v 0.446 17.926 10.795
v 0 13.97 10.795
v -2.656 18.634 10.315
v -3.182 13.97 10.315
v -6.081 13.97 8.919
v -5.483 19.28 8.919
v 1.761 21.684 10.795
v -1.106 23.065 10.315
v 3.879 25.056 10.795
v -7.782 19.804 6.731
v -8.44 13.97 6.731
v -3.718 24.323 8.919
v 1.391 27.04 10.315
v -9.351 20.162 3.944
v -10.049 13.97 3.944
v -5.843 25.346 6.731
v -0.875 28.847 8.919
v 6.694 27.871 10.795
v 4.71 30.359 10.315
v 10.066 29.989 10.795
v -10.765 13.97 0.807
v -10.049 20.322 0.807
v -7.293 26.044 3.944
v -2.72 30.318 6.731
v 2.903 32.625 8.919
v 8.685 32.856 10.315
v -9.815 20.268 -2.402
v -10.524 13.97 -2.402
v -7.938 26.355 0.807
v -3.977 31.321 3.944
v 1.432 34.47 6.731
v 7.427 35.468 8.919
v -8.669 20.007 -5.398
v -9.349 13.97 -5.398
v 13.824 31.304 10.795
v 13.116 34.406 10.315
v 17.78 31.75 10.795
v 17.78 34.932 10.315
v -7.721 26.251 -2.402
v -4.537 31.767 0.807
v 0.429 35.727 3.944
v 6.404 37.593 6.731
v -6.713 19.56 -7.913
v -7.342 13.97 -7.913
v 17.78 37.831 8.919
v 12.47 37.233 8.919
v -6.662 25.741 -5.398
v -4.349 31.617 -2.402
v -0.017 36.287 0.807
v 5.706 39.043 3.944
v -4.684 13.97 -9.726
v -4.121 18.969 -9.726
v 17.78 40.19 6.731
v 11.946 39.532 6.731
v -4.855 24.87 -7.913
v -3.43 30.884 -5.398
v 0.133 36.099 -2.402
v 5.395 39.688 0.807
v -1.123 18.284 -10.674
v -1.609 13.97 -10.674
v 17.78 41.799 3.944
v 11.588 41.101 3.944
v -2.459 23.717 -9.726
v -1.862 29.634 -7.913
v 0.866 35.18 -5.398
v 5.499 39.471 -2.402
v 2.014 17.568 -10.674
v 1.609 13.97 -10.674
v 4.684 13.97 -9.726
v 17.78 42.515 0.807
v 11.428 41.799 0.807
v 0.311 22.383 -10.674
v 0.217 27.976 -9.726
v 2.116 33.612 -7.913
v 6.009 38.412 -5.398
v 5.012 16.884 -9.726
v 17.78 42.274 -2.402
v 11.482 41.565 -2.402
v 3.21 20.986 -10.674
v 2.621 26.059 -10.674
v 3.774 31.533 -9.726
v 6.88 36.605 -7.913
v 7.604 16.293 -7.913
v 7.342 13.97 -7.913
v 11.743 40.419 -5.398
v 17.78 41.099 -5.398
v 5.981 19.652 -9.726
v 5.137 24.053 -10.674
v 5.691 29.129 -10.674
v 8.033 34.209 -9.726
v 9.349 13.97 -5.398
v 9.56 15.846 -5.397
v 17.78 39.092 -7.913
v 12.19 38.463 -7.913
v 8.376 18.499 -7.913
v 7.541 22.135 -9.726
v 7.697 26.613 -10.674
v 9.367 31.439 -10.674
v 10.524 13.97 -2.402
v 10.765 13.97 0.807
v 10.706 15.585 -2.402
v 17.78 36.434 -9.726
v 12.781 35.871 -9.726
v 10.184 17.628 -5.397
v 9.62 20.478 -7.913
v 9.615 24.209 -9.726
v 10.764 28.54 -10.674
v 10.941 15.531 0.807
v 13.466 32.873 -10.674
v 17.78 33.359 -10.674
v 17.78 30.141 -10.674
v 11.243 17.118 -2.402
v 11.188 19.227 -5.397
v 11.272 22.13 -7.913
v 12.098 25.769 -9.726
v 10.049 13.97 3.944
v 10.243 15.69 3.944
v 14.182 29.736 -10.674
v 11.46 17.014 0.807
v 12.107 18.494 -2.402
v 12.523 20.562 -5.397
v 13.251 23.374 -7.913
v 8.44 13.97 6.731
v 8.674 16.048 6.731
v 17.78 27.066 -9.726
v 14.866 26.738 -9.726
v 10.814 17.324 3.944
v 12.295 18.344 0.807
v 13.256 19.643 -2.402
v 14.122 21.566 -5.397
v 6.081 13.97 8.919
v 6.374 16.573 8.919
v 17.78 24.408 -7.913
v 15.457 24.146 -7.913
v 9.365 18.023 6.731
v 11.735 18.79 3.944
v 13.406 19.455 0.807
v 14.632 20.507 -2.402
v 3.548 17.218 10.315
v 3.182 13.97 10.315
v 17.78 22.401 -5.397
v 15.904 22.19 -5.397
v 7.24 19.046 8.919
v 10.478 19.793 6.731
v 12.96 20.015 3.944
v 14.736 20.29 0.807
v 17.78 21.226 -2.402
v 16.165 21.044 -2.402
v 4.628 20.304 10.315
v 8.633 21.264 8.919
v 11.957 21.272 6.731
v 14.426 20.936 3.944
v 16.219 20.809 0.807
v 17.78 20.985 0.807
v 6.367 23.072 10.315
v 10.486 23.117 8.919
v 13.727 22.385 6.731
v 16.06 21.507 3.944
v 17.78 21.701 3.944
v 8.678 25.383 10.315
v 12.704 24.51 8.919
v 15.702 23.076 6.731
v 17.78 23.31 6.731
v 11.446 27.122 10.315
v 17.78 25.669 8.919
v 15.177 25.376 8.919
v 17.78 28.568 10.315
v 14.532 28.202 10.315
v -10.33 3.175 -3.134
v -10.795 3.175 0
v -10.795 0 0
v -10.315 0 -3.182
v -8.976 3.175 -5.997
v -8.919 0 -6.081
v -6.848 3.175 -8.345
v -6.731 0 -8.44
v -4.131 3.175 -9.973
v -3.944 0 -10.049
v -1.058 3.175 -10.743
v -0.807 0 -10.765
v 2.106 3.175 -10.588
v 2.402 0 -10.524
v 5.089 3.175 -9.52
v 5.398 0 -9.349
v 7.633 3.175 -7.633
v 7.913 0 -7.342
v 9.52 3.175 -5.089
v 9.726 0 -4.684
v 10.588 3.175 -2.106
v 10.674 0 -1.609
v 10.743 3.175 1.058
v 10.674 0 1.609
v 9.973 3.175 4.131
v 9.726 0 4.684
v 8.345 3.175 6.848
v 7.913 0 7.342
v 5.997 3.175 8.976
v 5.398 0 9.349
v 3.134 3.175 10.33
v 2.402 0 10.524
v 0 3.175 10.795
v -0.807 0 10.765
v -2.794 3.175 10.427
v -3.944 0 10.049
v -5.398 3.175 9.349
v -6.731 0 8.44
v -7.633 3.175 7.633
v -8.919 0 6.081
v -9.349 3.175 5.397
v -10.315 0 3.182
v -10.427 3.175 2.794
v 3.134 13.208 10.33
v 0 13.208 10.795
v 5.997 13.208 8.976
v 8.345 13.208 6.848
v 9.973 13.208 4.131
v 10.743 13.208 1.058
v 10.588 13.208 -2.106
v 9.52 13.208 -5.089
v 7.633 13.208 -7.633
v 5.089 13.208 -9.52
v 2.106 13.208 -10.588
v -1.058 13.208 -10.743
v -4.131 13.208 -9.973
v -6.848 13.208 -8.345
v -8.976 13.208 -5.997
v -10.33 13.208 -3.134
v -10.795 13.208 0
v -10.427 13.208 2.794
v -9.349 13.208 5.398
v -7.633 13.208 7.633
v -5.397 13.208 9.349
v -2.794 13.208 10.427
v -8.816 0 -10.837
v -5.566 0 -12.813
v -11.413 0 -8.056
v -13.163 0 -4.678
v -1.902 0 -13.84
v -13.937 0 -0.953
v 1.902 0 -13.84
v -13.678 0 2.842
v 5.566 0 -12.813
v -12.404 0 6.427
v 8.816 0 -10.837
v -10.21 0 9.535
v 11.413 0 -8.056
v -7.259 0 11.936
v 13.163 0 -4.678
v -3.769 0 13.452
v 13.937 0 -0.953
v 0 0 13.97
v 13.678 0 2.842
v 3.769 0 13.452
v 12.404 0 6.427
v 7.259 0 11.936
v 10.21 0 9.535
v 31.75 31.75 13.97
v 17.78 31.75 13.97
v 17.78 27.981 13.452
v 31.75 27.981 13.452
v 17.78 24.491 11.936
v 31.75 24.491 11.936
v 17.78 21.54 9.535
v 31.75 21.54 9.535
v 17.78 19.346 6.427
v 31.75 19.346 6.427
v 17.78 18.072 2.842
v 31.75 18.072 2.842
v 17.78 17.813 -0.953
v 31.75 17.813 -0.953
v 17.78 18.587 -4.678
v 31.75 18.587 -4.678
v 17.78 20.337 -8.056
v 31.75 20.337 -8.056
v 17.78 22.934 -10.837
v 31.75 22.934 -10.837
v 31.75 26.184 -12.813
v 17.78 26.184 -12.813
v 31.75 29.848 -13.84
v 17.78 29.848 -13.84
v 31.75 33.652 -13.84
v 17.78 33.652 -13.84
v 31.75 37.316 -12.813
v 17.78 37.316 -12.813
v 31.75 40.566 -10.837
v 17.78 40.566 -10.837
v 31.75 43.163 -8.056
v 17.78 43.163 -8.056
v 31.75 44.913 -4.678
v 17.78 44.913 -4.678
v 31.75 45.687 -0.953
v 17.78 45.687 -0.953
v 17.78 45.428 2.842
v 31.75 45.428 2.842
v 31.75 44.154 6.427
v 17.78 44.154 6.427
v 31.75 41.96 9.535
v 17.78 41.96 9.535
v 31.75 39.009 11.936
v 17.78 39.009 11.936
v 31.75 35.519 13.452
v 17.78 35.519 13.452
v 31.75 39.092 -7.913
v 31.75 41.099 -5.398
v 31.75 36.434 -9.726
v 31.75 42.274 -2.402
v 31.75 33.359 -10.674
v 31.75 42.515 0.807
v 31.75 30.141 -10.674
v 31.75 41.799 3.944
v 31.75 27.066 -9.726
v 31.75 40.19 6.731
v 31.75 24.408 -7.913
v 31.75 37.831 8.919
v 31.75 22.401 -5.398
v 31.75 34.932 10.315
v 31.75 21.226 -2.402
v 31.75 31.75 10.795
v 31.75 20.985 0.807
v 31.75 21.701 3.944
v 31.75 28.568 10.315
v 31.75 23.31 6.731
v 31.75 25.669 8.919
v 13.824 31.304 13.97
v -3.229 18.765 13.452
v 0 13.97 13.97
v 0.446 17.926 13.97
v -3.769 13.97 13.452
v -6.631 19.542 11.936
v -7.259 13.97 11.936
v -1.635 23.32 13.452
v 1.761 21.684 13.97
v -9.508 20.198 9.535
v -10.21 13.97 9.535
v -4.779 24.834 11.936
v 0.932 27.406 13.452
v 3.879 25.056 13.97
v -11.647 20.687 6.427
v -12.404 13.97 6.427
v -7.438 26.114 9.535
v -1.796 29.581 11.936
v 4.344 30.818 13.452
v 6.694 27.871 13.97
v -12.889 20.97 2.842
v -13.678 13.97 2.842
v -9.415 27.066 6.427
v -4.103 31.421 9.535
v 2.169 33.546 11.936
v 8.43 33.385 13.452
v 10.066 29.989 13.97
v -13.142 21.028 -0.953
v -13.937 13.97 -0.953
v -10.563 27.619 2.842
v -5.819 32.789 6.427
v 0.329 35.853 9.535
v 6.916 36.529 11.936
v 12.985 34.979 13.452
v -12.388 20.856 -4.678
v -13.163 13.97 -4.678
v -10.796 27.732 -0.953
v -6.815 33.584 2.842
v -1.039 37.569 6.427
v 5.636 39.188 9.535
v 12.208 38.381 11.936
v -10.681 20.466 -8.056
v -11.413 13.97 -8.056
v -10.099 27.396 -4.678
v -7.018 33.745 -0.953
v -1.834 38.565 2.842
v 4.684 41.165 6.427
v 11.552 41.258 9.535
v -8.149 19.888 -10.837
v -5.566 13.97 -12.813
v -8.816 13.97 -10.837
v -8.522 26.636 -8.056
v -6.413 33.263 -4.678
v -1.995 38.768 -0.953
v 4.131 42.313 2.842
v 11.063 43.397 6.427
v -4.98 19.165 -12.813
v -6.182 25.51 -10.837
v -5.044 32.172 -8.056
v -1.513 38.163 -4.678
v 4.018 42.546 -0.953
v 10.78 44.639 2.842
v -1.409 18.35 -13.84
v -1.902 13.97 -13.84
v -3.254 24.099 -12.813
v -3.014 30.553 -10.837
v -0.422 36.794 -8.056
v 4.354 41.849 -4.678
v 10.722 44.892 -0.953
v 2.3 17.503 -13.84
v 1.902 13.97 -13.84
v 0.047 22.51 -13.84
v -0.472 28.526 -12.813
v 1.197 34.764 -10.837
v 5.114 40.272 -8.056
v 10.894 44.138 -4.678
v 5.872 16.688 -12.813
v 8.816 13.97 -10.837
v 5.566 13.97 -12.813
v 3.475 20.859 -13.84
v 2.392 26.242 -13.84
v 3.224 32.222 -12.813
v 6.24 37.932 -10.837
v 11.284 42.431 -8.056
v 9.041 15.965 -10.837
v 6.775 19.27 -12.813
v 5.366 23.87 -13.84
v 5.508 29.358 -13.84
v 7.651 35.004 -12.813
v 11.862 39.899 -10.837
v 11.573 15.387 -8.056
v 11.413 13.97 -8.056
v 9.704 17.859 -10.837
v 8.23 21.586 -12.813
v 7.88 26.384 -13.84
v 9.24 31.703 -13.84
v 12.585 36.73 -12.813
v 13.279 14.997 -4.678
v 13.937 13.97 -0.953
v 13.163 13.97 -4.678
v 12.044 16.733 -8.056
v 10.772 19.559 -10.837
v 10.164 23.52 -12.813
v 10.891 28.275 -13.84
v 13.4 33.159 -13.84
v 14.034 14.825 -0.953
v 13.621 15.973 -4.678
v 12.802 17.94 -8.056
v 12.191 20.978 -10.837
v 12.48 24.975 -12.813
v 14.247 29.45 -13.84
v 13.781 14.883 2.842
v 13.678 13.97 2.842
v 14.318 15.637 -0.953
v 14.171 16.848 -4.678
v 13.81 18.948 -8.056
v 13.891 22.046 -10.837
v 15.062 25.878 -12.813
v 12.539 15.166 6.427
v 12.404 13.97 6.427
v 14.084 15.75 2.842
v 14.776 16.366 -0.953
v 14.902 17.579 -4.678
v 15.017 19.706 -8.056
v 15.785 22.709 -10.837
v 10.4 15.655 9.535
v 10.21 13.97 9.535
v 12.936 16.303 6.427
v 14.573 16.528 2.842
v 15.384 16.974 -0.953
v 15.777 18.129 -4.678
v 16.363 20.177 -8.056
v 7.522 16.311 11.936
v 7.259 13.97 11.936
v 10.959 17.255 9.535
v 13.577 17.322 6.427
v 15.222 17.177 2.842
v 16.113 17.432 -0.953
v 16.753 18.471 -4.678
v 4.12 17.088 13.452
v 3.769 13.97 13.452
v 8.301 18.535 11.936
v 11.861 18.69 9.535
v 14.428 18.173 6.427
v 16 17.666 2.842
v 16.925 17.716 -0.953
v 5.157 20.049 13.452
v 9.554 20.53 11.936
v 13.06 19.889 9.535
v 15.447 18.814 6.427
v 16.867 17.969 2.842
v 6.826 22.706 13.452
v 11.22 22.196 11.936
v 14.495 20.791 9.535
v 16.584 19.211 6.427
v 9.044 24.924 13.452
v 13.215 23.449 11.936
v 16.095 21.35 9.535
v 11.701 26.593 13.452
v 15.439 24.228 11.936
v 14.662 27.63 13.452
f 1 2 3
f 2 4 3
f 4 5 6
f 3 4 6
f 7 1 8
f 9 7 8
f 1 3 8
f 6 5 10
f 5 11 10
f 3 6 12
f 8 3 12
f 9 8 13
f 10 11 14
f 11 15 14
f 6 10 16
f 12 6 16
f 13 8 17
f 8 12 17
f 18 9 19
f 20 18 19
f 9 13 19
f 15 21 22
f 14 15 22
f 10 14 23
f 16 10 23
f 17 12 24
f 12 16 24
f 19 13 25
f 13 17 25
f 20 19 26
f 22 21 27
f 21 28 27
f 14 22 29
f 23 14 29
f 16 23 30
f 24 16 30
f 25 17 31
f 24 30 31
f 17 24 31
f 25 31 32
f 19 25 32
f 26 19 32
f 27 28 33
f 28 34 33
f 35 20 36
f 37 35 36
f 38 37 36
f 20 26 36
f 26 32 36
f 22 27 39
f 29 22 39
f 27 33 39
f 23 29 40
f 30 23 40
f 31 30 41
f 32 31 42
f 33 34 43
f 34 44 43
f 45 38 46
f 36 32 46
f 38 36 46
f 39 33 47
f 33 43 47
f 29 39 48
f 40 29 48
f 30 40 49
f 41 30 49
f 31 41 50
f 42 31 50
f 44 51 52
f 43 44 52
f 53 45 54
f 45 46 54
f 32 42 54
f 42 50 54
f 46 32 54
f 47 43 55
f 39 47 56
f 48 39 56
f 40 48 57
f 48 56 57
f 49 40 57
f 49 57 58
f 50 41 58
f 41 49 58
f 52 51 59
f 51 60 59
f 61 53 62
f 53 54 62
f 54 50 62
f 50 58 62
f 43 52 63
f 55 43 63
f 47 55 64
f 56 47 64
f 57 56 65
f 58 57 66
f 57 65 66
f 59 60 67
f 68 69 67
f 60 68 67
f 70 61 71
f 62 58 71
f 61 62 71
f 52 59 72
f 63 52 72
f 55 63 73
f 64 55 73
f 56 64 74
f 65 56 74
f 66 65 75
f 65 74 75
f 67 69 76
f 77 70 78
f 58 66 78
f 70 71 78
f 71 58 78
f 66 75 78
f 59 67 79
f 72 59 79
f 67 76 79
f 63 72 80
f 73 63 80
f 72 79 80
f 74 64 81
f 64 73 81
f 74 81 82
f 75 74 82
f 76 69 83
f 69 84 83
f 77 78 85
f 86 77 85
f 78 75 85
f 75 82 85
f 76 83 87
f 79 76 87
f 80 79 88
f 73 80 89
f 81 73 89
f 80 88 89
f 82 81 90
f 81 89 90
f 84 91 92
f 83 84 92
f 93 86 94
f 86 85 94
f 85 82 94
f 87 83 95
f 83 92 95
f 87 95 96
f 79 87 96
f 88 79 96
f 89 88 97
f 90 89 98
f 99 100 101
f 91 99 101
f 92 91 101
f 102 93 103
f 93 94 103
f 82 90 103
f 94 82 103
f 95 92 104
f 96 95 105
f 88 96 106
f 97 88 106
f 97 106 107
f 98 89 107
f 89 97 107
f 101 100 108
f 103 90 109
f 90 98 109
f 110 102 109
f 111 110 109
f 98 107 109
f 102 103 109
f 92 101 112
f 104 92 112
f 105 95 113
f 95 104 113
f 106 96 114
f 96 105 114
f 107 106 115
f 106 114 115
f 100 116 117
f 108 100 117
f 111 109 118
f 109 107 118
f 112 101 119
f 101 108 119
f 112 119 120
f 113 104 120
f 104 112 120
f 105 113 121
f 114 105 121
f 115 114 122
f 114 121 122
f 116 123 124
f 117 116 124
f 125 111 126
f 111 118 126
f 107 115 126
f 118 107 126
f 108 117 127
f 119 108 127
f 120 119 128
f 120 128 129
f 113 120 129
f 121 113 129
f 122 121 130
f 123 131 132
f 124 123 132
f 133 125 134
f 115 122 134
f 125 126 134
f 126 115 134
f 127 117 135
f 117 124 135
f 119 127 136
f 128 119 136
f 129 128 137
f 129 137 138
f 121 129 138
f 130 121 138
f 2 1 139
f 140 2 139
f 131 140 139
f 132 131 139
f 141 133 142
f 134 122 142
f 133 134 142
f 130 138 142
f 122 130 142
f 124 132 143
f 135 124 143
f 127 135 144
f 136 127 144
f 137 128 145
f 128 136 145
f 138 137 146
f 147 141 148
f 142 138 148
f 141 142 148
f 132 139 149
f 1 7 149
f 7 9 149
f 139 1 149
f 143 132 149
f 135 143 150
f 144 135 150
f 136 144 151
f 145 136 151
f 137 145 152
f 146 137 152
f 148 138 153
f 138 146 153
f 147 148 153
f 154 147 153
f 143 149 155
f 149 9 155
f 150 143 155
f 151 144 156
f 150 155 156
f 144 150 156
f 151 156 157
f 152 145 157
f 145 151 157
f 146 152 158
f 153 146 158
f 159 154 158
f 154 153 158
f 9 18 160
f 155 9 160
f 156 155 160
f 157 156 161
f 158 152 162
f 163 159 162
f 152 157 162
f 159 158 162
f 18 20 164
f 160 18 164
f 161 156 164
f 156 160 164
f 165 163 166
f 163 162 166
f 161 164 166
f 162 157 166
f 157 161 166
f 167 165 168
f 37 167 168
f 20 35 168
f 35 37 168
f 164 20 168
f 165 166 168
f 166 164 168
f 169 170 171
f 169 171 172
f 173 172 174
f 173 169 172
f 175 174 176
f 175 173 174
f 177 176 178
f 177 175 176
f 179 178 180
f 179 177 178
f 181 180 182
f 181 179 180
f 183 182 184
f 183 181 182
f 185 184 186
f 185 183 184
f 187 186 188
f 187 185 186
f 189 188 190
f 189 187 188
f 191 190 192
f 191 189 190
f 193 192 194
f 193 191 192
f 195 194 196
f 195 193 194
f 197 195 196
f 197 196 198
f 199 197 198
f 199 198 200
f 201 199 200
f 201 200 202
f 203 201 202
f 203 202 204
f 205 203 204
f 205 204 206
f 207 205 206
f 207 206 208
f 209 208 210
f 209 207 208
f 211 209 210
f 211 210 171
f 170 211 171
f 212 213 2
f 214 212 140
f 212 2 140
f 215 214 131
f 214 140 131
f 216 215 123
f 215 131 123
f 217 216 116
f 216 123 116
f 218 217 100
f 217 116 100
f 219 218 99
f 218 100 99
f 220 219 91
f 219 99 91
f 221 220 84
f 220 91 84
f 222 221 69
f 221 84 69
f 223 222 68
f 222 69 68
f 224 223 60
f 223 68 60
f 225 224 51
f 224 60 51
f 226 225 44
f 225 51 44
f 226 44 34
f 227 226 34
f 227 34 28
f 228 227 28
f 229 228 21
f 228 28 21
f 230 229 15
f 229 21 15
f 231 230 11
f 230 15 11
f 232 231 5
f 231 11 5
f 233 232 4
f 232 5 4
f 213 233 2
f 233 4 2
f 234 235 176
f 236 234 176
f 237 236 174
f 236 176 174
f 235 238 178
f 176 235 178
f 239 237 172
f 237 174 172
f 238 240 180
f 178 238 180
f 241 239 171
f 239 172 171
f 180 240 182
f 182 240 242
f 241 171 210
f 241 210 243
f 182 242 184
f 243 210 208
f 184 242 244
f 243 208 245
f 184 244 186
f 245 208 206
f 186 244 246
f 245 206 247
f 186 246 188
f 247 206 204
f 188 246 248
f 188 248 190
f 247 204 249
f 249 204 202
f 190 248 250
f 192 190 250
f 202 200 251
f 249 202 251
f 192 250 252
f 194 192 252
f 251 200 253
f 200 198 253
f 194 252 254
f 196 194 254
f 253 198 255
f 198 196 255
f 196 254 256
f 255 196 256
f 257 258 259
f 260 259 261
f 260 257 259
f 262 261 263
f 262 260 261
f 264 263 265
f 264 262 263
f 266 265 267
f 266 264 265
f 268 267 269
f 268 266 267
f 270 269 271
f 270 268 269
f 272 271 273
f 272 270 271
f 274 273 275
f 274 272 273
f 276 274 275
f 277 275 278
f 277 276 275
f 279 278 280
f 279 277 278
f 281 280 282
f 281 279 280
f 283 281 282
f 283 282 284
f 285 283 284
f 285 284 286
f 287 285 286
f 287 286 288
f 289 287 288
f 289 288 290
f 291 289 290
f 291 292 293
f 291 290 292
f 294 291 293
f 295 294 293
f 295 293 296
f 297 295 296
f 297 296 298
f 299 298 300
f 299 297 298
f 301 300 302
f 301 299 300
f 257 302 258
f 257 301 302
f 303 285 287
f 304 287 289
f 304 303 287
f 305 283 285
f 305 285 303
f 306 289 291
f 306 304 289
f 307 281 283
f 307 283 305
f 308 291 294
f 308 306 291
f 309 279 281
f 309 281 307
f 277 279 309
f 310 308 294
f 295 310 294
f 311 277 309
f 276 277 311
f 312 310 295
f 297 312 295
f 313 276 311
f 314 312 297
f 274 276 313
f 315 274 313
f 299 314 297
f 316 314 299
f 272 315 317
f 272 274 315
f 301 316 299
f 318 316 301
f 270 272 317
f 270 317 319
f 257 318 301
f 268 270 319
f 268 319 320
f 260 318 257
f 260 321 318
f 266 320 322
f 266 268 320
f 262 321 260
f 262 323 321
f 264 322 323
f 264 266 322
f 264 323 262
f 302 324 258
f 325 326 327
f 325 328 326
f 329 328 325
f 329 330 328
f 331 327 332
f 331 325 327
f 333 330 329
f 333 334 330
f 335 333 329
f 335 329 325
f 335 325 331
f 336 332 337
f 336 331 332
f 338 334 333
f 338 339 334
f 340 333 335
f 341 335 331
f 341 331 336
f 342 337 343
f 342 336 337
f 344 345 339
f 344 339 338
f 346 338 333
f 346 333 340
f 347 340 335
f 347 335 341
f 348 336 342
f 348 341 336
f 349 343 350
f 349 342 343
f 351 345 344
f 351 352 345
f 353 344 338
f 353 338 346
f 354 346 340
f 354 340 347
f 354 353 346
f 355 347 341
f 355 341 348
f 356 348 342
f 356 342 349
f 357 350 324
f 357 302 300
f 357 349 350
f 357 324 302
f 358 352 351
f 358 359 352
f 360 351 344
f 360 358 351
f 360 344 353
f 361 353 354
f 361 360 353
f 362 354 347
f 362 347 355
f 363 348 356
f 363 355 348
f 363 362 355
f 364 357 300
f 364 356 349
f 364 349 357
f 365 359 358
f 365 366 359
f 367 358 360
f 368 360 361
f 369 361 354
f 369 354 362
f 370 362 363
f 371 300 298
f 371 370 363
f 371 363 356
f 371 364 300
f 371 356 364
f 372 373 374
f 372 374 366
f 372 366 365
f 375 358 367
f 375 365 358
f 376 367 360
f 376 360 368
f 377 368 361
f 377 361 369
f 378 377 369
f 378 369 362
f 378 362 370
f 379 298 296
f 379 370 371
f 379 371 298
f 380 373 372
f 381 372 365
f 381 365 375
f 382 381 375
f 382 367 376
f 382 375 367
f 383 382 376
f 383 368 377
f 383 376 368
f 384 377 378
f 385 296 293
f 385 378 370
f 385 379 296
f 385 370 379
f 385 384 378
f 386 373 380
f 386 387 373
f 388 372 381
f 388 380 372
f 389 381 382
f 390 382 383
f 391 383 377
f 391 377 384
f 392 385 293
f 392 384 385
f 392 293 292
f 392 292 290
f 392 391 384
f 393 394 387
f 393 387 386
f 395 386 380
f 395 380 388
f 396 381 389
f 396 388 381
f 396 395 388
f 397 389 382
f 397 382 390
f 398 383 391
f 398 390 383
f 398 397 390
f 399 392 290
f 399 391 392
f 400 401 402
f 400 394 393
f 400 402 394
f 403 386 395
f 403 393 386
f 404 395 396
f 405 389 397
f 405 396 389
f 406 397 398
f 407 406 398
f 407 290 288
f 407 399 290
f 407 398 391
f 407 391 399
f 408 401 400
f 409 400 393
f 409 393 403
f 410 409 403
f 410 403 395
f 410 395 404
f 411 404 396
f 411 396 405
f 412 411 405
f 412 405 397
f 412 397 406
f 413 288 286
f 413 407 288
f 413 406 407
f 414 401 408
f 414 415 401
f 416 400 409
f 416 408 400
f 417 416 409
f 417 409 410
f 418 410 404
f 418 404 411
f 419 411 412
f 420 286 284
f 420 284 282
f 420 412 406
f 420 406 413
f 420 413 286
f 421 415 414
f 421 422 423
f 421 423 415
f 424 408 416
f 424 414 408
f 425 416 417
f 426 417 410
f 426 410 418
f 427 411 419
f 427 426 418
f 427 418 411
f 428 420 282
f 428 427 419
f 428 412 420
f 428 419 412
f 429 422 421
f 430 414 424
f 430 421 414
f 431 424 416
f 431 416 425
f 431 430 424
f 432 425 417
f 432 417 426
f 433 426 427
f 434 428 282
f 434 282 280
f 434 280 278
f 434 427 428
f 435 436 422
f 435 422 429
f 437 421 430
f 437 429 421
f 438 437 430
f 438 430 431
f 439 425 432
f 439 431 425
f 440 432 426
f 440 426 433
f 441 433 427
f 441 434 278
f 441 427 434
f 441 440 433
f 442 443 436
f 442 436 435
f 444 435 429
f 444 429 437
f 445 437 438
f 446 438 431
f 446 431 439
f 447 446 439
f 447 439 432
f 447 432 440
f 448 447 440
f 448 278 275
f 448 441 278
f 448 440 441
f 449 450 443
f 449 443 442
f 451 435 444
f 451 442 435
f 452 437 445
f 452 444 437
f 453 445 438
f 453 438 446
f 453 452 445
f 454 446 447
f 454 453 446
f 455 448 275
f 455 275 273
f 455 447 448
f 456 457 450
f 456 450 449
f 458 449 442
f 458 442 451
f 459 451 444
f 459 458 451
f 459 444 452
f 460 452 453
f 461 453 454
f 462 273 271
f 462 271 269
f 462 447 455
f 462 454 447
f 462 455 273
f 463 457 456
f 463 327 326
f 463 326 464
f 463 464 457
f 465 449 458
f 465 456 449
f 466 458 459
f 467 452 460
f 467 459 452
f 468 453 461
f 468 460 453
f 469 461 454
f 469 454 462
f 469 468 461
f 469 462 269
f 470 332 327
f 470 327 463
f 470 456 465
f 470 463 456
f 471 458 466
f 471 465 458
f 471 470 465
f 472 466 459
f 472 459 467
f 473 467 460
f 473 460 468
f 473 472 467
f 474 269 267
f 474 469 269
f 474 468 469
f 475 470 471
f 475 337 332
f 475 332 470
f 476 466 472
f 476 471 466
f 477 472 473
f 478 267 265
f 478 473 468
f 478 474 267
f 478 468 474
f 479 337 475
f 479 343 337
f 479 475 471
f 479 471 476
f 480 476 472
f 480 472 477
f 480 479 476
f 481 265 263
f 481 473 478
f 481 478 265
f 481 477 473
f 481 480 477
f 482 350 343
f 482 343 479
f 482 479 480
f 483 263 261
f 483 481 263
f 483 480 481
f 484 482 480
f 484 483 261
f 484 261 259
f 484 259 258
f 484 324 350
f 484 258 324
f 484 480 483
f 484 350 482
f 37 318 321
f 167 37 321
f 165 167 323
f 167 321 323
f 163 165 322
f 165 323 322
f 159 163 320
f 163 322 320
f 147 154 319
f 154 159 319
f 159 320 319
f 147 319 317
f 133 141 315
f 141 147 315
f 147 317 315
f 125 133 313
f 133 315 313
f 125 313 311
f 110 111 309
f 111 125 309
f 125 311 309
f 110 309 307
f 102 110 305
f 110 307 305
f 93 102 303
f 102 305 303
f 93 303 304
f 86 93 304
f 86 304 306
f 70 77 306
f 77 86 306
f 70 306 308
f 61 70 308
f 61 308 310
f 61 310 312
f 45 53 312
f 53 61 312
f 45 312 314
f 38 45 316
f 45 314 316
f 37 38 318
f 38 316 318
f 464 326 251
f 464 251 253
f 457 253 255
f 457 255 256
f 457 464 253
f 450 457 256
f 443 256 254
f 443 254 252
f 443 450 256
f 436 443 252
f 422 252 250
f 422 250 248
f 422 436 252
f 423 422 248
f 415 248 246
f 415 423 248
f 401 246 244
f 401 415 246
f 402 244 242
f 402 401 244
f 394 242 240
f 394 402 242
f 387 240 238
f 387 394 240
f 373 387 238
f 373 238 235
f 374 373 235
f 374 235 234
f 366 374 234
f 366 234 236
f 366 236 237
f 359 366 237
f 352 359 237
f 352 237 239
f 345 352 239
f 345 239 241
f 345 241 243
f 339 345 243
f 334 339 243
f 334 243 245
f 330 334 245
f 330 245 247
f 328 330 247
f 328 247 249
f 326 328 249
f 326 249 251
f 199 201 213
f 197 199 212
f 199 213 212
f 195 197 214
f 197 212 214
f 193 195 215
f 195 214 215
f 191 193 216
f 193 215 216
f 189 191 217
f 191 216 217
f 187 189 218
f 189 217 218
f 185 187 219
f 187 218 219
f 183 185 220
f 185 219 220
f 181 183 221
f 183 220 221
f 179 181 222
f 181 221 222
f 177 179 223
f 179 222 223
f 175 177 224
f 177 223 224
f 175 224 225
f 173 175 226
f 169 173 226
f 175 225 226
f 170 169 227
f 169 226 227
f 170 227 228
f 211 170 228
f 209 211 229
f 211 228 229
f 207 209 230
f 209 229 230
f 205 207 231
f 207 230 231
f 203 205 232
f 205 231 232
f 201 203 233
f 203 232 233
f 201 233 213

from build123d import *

# Parameters (mm, degrees)
SWEEP1_PROFILE_R   = 13.97
SHELL1_T           = -3.175
CUT_EXTRUDE1_START = -13.208
SKETCH28_R         = 10.795
CUT_EXTRUDE1_DEPTH = 13.208


with BuildPart() as part:
    # Sweep1: sweep along a path in Sketch1
    with BuildLine(Plane.XY) as sweep1_path:
        Line((0, 0), (0, 13.97))
        ThreePointArc((0, 13.97), (5.207641431, 26.542358569), (17.78, 31.75))
        Line((17.78, 31.75), (31.75, 31.75))
    # Sweep1 profile (on start of the path) → Sweep1 (sweep)
    with BuildSketch(Plane.ZX):
        Circle(SWEEP1_PROFILE_R)
    sweep(path=sweep1_path.line)

    # Shell1
    shell1_openings = [part.faces().sort_by_distance(p)[0] for p in [
        (31.75, 31.75, 0),
    ]]
    offset(amount=SHELL1_T, openings=shell1_openings, kind=Kind.INTERSECTION)

    # Sketch28 → Cut-Extrude1 (cut)
    with BuildSketch(Plane.XZ.offset(CUT_EXTRUDE1_START)):
        with Locations(Location((0, 0, 0), (0, 0, 180))):
            Circle(SKETCH28_R)
    extrude(amount=CUT_EXTRUDE1_DEPTH, mode=Mode.SUBTRACT)


solid = part.part
